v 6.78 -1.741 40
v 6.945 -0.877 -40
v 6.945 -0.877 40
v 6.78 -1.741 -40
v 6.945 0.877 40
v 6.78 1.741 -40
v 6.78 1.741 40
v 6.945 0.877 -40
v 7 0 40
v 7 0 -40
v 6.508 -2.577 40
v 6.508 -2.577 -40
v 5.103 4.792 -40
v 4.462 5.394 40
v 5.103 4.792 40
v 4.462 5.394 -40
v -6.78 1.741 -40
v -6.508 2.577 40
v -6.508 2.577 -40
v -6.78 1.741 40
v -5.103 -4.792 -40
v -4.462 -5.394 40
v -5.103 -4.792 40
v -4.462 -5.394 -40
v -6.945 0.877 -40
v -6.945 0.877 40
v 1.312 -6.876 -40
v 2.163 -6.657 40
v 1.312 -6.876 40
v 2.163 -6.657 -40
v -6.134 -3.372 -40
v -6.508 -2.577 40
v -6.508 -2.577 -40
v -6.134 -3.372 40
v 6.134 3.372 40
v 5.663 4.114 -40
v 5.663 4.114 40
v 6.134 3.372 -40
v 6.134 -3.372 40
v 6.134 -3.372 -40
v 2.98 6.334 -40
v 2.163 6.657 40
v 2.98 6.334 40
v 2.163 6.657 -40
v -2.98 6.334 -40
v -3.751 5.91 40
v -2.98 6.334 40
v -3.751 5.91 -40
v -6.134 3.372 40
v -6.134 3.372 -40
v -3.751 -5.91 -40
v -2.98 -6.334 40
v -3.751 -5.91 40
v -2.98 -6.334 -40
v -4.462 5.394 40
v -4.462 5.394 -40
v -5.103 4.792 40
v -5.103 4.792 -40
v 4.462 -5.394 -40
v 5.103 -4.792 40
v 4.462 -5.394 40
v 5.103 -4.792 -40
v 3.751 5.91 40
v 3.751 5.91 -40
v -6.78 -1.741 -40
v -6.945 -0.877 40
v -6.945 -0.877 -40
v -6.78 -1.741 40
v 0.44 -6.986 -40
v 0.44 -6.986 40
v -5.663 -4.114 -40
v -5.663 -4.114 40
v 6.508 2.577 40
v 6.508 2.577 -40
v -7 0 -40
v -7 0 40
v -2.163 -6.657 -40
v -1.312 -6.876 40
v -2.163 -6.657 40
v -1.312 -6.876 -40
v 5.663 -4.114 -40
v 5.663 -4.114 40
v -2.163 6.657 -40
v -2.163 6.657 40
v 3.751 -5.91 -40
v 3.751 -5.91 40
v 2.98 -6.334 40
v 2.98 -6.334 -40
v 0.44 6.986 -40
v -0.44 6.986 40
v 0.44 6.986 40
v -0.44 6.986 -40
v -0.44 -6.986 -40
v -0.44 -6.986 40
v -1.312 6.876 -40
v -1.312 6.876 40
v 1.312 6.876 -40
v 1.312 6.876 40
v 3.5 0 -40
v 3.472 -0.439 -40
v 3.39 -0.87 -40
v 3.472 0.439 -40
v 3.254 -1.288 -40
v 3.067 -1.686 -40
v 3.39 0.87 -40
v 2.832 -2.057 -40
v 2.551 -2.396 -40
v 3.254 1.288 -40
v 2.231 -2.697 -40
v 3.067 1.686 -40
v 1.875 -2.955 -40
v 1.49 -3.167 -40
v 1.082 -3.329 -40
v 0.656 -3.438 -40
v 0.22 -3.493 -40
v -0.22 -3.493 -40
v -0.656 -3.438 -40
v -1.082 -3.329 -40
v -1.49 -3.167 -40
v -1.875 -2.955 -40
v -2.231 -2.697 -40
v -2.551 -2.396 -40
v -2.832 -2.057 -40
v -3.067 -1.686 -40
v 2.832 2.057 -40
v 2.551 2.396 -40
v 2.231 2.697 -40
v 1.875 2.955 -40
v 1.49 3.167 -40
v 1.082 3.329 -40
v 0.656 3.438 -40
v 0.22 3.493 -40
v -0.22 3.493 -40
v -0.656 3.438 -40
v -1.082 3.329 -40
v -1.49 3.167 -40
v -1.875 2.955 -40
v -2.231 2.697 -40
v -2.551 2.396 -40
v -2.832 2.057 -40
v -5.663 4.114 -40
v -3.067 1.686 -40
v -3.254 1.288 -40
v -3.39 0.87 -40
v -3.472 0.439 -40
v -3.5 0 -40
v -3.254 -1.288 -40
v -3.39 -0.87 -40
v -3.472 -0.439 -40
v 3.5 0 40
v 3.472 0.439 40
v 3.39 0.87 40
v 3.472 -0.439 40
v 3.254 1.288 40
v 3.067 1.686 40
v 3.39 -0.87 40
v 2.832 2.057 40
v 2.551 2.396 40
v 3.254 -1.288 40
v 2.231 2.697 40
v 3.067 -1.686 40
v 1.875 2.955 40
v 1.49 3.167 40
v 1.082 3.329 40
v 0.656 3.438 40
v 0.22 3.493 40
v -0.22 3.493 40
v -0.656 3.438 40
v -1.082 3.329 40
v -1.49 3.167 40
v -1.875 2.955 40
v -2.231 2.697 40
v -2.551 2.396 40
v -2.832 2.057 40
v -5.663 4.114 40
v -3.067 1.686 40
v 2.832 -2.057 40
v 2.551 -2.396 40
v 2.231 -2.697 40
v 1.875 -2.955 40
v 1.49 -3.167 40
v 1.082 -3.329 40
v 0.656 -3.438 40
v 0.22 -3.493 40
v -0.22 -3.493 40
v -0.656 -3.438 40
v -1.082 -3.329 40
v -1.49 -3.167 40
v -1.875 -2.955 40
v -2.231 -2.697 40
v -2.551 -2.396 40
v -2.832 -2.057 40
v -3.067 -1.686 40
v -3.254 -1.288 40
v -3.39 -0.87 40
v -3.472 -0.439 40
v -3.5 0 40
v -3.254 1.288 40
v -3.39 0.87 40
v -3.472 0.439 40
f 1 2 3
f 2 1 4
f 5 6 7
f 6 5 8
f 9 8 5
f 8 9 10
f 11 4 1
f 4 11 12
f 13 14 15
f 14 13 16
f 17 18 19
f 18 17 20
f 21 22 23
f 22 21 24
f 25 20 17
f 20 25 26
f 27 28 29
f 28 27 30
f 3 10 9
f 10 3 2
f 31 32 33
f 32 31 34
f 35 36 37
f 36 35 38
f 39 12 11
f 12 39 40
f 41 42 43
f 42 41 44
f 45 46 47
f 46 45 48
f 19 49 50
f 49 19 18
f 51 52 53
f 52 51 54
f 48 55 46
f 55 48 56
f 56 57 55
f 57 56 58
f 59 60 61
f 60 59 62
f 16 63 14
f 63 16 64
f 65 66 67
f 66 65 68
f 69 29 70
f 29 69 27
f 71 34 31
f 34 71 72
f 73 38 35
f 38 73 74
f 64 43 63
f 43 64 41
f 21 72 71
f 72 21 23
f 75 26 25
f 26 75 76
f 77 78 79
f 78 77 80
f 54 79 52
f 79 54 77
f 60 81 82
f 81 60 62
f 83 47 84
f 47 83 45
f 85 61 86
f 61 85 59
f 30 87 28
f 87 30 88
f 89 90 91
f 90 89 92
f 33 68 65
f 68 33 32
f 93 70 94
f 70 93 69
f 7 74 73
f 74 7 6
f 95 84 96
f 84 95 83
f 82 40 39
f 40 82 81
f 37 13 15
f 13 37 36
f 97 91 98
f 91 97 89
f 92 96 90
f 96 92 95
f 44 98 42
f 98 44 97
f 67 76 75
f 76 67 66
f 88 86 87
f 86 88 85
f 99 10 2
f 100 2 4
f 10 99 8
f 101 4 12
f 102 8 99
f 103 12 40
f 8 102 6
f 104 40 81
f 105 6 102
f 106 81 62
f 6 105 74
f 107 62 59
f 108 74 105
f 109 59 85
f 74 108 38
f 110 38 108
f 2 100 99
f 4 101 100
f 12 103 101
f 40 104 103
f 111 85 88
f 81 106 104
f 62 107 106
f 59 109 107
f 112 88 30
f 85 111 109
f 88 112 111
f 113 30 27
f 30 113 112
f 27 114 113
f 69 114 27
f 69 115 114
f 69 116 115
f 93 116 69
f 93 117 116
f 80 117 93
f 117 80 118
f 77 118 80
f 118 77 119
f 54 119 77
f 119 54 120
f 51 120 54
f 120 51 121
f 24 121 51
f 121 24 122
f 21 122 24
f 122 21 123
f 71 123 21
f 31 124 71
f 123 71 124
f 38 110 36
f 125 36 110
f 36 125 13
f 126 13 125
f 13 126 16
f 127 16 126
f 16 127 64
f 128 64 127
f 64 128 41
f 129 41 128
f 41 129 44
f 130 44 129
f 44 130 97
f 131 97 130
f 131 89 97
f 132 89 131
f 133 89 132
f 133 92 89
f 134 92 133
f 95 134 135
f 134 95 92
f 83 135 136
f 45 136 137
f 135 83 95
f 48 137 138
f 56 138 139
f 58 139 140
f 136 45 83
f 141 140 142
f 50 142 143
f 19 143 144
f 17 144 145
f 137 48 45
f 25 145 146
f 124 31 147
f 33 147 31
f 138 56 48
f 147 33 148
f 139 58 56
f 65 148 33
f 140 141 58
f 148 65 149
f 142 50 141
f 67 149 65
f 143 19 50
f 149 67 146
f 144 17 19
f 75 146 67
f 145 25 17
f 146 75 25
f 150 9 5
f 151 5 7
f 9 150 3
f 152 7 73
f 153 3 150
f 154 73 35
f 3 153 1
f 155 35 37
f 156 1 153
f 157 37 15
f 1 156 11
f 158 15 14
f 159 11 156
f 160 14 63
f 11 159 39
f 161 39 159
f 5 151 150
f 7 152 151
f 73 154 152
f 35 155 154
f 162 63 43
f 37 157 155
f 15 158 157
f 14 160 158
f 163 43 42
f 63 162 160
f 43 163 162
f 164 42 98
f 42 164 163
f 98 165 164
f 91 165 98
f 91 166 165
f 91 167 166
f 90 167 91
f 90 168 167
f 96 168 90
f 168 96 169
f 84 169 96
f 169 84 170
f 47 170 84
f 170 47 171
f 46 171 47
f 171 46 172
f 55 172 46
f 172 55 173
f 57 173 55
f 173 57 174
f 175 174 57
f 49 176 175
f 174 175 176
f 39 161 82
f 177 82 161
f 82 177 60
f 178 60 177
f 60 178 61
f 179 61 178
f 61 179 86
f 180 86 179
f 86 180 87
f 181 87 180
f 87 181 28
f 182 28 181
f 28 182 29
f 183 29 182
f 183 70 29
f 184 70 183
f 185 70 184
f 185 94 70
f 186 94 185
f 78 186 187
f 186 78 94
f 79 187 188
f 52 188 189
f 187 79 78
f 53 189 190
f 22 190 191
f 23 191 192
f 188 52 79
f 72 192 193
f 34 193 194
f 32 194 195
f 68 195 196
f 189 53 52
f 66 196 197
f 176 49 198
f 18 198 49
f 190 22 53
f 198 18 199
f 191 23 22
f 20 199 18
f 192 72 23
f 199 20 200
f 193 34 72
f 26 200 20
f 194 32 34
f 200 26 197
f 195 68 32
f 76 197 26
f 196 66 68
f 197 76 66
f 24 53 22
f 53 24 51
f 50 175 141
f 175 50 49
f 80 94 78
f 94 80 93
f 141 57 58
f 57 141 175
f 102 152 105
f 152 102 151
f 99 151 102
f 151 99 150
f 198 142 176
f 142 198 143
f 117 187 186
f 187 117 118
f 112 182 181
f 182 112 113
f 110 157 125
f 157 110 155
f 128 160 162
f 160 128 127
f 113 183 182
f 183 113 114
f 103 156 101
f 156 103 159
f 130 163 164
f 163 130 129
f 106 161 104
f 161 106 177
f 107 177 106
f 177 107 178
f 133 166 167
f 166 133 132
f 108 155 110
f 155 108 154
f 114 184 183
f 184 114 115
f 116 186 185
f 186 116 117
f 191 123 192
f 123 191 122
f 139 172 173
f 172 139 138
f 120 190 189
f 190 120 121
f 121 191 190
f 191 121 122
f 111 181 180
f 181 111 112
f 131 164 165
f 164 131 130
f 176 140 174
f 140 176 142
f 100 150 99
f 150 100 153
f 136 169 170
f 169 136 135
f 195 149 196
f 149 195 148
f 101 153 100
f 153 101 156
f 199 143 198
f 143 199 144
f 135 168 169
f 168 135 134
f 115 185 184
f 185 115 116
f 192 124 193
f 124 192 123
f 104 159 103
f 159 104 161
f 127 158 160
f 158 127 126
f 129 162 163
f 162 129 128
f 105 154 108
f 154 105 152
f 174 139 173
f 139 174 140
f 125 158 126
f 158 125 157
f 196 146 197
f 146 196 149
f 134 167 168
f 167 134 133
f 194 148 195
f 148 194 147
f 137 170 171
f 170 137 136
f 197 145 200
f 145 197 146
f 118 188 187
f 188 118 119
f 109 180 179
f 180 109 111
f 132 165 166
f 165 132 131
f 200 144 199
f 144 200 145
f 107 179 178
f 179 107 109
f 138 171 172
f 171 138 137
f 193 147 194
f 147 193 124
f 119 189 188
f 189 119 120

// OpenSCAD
$fn = 50;


difference() {
	union() {
		translate(v = [0, 0, -40.0000000000]) {
			cylinder(h = 80, r = 7.0000000000);
		}
	}
	union() {
		translate(v = [0, 0, -100.0000000000]) {
			cylinder(h = 200, r = 3.5000000000);
		}
	}
}
